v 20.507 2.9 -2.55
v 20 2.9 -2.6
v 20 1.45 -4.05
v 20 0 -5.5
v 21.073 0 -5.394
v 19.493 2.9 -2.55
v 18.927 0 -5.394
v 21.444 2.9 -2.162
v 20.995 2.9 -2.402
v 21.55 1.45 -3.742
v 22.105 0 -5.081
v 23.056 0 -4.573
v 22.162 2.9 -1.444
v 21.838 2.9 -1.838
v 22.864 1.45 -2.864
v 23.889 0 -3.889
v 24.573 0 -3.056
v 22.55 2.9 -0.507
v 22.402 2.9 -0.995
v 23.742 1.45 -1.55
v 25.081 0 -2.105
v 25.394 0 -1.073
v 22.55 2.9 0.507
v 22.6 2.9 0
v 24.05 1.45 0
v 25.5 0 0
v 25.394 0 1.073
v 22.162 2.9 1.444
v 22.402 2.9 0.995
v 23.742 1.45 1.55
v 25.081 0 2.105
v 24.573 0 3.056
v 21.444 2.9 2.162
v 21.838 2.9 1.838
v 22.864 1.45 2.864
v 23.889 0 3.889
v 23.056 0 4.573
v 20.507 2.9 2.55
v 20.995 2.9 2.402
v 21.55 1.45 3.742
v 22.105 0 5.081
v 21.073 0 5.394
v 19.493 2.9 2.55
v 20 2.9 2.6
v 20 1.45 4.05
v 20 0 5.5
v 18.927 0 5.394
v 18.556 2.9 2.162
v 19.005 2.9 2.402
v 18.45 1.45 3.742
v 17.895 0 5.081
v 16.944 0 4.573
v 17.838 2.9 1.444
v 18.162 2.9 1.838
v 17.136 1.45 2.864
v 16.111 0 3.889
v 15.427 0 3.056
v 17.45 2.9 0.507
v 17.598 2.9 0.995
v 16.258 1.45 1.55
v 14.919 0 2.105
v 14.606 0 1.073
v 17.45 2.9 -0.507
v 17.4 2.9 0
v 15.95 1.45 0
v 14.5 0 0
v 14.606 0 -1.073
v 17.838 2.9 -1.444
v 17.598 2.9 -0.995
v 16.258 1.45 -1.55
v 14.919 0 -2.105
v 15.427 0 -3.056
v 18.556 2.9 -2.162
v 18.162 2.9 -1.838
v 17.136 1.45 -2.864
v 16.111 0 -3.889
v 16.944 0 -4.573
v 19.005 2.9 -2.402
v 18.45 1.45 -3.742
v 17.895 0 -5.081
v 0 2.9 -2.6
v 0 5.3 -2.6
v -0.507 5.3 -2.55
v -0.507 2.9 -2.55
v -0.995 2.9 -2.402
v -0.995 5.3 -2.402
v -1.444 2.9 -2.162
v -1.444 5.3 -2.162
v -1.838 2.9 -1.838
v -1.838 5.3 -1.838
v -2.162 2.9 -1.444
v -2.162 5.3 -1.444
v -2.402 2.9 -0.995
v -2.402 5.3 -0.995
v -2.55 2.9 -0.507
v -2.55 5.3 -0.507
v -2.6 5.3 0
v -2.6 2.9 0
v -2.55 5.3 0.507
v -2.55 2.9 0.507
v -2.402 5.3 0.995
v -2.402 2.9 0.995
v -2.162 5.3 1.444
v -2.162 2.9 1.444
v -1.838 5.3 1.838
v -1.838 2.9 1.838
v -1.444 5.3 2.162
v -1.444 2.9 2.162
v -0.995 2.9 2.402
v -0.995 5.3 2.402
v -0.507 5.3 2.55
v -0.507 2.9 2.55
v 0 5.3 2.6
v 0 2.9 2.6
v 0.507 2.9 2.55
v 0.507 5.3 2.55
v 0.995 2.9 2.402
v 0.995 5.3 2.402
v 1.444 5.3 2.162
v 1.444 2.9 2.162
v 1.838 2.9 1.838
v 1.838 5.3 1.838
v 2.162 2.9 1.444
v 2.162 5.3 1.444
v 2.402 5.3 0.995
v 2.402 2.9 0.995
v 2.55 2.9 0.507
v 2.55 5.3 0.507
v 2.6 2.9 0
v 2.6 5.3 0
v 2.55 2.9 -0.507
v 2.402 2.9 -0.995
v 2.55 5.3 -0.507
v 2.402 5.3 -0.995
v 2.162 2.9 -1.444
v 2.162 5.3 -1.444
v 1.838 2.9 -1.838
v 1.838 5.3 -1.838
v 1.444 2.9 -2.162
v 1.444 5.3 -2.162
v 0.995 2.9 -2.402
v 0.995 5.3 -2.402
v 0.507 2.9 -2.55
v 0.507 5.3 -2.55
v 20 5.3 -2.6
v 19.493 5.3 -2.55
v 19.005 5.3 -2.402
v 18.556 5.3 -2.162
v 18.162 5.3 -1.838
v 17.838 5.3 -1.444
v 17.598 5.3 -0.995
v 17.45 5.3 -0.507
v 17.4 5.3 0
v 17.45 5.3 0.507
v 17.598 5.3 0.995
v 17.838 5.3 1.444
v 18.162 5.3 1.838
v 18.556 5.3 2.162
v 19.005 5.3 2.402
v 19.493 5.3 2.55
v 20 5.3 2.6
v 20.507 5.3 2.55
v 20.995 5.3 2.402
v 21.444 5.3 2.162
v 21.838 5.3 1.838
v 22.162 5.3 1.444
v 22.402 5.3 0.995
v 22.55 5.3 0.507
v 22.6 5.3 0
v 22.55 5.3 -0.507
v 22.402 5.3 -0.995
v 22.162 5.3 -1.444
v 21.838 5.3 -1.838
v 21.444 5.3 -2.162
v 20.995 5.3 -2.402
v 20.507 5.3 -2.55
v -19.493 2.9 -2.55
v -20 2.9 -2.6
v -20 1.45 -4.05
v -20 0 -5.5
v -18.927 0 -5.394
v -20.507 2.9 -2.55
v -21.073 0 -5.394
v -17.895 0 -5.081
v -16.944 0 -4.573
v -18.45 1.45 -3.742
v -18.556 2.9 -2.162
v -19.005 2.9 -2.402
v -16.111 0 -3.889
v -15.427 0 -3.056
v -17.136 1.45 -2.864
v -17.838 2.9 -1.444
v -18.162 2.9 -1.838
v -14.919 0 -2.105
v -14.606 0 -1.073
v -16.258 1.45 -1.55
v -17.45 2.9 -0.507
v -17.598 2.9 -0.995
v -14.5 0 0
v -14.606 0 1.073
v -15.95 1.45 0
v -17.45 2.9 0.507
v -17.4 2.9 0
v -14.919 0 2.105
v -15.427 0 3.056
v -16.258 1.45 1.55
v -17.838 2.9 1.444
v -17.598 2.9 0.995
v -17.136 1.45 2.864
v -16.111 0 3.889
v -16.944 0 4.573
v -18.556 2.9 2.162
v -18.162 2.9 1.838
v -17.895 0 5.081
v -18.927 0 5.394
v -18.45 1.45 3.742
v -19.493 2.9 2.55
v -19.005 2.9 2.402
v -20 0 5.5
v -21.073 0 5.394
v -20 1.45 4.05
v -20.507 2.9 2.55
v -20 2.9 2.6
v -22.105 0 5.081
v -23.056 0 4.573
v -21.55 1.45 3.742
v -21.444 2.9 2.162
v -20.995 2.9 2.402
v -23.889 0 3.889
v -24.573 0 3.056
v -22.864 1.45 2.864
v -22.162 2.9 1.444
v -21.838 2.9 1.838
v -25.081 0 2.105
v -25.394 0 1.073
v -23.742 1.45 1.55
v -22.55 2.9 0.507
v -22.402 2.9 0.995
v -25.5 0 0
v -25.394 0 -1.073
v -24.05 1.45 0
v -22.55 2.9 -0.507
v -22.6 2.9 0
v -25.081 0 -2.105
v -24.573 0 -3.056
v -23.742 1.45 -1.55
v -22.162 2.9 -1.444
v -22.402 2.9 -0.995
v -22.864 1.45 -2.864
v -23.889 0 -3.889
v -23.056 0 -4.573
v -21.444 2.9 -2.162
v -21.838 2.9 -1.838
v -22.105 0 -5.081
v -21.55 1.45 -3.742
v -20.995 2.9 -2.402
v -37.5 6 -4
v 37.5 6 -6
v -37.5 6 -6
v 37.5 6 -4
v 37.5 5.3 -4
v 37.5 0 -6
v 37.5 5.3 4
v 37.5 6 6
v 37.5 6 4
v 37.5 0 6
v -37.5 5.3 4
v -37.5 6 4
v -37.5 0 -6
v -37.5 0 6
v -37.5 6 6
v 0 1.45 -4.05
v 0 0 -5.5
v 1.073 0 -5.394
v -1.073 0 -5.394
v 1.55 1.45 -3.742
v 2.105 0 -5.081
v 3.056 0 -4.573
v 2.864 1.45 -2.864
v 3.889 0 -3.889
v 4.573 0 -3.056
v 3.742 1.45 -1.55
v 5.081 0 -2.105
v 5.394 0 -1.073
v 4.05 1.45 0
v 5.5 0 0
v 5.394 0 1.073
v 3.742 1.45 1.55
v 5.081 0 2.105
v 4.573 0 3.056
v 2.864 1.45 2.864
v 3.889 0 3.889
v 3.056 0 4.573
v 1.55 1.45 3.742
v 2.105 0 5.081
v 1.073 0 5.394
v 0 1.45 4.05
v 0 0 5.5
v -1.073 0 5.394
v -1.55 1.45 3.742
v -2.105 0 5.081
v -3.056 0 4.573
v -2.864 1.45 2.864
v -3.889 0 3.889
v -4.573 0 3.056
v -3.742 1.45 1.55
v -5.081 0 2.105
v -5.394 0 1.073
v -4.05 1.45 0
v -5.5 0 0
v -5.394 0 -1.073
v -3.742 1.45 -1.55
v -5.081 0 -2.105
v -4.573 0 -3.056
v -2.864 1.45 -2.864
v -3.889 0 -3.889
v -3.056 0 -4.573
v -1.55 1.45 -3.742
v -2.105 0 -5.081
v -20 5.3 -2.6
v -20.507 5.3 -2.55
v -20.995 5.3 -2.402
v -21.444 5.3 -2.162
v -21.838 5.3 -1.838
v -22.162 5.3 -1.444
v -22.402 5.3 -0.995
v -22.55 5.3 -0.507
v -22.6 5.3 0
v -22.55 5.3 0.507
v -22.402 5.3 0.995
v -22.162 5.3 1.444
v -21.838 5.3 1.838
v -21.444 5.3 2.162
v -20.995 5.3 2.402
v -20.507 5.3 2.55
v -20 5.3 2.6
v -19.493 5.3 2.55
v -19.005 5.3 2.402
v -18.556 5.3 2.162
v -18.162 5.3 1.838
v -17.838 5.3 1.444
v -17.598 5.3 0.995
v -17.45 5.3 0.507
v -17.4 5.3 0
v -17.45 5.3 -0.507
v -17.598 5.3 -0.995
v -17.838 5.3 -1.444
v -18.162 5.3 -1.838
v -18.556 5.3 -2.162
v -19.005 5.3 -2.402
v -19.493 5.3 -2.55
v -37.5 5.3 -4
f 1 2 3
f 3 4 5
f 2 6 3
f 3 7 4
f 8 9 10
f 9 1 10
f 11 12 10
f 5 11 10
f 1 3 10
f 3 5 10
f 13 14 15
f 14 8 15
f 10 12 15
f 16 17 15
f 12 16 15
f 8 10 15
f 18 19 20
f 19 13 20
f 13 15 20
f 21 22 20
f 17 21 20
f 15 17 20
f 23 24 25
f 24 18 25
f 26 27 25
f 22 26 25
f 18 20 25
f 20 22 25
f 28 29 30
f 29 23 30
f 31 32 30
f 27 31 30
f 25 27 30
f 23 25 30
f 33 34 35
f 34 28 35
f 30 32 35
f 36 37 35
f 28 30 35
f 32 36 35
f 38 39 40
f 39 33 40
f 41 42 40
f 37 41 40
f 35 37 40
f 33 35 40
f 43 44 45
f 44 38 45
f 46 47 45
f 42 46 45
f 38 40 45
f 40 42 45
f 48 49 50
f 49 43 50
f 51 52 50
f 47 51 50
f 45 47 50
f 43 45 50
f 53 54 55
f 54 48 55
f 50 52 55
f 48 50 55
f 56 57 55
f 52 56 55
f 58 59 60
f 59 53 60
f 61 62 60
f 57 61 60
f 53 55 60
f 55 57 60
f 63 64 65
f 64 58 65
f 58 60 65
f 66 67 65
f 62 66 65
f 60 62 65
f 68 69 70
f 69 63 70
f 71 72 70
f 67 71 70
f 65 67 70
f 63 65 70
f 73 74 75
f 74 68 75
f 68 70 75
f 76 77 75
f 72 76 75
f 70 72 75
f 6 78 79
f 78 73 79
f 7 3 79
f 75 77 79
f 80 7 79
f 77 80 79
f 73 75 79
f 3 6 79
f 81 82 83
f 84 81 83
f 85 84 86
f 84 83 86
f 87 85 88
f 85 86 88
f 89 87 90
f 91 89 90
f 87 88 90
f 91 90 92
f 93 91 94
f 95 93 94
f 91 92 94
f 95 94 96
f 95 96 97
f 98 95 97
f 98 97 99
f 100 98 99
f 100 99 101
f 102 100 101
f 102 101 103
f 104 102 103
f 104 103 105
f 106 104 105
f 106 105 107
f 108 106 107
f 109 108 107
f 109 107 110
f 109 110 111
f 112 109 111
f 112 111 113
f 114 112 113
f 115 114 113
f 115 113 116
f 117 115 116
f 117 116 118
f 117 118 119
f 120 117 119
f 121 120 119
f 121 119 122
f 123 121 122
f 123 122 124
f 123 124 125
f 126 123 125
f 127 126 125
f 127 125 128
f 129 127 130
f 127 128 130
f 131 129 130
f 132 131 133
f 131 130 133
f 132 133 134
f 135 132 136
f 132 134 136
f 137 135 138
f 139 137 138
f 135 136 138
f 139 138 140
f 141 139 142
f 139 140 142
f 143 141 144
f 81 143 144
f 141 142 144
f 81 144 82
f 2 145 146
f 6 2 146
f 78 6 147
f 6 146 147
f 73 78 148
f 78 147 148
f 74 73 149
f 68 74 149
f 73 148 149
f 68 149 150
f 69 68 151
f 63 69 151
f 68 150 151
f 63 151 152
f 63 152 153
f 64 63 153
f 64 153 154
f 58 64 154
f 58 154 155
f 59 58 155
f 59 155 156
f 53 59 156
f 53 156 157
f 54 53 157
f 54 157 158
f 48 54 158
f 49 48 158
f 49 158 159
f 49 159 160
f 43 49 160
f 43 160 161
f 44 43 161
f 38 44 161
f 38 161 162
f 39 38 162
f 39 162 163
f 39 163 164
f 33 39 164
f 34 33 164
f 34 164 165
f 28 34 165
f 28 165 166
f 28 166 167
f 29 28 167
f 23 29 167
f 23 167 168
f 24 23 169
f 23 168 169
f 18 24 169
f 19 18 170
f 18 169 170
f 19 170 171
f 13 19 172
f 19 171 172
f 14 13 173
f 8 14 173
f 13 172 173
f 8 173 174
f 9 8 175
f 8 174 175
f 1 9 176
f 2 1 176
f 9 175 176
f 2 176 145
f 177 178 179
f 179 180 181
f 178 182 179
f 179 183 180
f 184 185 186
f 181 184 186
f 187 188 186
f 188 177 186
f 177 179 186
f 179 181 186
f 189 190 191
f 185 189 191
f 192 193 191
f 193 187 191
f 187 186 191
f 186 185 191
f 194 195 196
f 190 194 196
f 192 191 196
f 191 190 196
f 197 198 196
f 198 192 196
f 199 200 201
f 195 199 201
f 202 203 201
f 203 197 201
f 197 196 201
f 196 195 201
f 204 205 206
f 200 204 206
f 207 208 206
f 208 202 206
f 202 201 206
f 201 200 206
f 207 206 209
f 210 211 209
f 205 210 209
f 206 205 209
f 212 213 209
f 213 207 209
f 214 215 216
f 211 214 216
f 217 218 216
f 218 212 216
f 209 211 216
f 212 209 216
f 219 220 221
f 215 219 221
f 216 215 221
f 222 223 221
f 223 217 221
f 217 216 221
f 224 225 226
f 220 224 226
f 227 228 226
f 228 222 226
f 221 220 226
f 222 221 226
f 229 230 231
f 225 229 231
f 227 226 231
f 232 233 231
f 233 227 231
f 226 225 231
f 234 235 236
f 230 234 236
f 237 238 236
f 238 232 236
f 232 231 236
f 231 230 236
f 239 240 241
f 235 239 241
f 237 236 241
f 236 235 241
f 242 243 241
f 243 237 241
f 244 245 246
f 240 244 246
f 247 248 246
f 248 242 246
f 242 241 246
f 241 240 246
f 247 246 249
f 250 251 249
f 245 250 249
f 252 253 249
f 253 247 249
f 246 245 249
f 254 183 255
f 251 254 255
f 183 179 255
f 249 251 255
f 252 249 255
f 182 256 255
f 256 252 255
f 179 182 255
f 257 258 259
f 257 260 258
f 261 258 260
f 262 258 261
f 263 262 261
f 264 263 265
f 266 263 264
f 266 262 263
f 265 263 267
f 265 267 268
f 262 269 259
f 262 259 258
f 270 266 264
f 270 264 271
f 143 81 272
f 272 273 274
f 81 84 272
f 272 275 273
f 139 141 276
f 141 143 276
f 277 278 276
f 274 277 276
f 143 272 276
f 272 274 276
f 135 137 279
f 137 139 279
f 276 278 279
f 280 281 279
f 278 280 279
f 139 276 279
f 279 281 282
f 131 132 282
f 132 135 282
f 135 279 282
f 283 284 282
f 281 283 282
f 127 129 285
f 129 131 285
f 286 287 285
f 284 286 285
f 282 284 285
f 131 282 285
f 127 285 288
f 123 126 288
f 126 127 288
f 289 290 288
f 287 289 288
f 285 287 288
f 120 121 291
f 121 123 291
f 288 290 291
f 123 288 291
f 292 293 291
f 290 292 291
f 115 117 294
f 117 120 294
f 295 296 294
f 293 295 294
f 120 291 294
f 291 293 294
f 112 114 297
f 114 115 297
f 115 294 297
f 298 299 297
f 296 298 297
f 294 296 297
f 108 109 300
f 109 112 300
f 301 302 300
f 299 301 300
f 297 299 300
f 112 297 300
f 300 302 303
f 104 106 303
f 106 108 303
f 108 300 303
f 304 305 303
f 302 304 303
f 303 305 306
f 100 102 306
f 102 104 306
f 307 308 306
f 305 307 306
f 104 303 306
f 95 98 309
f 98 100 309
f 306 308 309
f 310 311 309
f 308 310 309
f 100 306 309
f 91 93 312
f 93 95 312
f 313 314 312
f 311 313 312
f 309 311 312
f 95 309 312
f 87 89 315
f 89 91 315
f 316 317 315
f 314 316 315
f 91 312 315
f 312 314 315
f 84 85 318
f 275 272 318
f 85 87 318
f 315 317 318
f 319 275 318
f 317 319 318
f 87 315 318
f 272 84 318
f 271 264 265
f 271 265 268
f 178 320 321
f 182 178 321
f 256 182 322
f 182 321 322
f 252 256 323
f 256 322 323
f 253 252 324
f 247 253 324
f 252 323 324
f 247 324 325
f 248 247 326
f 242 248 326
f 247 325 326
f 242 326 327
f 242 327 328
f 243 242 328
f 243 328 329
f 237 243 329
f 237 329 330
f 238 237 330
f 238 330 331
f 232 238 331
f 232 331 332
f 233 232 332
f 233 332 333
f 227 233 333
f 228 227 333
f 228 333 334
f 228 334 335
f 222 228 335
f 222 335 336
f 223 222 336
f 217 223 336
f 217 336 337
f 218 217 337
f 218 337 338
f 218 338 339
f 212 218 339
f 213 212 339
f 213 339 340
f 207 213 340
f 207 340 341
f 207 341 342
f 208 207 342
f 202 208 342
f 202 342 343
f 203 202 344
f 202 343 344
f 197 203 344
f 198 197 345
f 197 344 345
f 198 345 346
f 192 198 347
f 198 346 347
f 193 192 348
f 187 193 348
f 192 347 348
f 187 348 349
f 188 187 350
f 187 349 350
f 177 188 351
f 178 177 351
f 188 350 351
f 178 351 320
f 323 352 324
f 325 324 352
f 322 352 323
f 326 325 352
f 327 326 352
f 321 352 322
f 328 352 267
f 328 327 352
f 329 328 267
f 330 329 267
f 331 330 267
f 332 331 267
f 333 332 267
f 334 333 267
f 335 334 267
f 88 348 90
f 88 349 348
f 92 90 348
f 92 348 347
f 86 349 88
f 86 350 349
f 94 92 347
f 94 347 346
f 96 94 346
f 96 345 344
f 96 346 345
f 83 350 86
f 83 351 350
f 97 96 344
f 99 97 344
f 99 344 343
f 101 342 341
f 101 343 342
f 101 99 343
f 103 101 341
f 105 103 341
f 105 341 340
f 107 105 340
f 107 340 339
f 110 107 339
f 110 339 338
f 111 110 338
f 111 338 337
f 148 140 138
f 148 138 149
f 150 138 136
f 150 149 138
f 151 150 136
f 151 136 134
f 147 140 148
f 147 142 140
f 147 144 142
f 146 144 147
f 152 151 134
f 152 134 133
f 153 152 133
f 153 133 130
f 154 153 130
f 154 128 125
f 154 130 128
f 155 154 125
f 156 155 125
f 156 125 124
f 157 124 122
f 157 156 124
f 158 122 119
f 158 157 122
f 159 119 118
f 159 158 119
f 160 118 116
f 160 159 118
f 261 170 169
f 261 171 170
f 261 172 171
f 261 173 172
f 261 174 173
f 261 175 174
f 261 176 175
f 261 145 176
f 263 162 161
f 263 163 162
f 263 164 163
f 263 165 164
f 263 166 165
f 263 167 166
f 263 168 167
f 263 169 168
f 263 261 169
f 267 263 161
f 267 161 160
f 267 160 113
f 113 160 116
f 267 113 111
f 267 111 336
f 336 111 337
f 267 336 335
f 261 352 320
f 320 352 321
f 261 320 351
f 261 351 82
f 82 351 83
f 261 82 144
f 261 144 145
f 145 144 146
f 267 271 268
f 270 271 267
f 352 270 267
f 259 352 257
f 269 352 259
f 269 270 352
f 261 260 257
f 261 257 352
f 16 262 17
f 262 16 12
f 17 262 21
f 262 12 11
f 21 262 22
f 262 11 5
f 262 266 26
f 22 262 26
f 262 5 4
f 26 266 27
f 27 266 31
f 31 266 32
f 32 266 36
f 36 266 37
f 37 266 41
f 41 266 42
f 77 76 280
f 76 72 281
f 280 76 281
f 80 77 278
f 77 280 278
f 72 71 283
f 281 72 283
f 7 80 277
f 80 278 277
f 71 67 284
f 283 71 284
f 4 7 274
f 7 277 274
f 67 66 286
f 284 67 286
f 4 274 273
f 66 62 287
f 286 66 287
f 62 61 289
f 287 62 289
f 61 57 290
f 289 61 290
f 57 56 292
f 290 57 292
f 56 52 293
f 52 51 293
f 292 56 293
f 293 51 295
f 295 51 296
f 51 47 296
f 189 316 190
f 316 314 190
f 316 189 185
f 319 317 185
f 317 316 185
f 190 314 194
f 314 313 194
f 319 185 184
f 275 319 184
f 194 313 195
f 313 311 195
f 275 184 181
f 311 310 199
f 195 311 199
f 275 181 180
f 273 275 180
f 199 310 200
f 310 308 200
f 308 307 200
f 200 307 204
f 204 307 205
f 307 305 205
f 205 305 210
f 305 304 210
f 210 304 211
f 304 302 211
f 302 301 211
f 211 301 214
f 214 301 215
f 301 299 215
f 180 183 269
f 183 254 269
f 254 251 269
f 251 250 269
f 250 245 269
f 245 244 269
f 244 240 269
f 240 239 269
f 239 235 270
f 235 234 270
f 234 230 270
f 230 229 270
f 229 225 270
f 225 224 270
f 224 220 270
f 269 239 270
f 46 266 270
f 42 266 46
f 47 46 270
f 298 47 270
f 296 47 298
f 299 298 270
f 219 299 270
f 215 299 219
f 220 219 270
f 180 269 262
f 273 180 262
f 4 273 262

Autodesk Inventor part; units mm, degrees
ref_plane "YZ Plane" through (0, 0, 0) normal (1, 0, 0) x (0, 1, 0)
ref_plane "XZ Plane" through (0, 0, 0) normal (0, 1, 0) x (-1, 0, 0)
ref_plane "XY Plane" through (0, 0, 0) normal (0, 0, 1) x (1, 0, 0)
sketch "Body Outline" plane through (0, 0, 0) normal (0, 1, 0) x (-1, 0, 0)
  line L0 (37.5, -6) -> (-37.5, -6)
  line L1 (-37.5, -6) -> (-37.5, 6)
  line L2 (-37.5, 6) -> (37.5, 6)
  line L3 (37.5, 6) -> (37.5, -6)
  point P0 (0, 0)
  dimension "d0" = 75
  dimension "d1" = 37.5
  dimension "d2" = 12
  dimension "d3" = 6
extrude "Body" add sketch "Body Outline" along normal blind 6
sketch "Clamp Cutout Outline" plane through (37.5, 0, 6) normal (1, 0, 0) x (0, 0, -1)
  line L0 (2, 7.3) -> (10, 7.3)
  line L1 (10, 7.3) -> (10, 5.3)
  line L2 (10, 5.3) -> (2, 5.3)
  line L3 (2, 5.3) -> (2, 7.3)
  line L4 (0, 6) -> (12, 6) projected
  line L5 (0, 0) -> (0, 6) projected
  line L6 (12, 0) -> (12, 6) projected
  point P0 (6, 0)
  dimension "d6" = 0.7
  dimension "d7" = 2
  dimension "d8" = 2
  dimension "d9" = 2
extrude "Clamp Cutout" cut sketch "Clamp Cutout Outline" along normal through all both and the other way through all
sketch "Fastening Hole Positions" plane through (0, 0, 0) normal (0, -1, 0) x (1, 0, 0)
  point P0 (0, 0)
  point P1 (20, 0)
  point P2 (0, 0)
  point P3 (-20, 0)
  dimension "d12" = 20
  dimension "d13" = 20
  dimension "d14" = 0
  dimension "d15" = 0
  dimension "d16" = 0
  dimension "d17" = 0
hole "Fastening Holes" at (20, 0, 0) at (0, 0, 0) at (-20, 0, 0) direction (0, 1, 0) diameter 5.2 end through all countersink diameter 11 countersink angle 90
equation "\"d1\" = 0.5 * d0"
equation "\"d3\" = 0.5 * d2"
equation "\"d8\" = d7"
properties part number "LR Small Clamp" material "Aluminum 6061"
